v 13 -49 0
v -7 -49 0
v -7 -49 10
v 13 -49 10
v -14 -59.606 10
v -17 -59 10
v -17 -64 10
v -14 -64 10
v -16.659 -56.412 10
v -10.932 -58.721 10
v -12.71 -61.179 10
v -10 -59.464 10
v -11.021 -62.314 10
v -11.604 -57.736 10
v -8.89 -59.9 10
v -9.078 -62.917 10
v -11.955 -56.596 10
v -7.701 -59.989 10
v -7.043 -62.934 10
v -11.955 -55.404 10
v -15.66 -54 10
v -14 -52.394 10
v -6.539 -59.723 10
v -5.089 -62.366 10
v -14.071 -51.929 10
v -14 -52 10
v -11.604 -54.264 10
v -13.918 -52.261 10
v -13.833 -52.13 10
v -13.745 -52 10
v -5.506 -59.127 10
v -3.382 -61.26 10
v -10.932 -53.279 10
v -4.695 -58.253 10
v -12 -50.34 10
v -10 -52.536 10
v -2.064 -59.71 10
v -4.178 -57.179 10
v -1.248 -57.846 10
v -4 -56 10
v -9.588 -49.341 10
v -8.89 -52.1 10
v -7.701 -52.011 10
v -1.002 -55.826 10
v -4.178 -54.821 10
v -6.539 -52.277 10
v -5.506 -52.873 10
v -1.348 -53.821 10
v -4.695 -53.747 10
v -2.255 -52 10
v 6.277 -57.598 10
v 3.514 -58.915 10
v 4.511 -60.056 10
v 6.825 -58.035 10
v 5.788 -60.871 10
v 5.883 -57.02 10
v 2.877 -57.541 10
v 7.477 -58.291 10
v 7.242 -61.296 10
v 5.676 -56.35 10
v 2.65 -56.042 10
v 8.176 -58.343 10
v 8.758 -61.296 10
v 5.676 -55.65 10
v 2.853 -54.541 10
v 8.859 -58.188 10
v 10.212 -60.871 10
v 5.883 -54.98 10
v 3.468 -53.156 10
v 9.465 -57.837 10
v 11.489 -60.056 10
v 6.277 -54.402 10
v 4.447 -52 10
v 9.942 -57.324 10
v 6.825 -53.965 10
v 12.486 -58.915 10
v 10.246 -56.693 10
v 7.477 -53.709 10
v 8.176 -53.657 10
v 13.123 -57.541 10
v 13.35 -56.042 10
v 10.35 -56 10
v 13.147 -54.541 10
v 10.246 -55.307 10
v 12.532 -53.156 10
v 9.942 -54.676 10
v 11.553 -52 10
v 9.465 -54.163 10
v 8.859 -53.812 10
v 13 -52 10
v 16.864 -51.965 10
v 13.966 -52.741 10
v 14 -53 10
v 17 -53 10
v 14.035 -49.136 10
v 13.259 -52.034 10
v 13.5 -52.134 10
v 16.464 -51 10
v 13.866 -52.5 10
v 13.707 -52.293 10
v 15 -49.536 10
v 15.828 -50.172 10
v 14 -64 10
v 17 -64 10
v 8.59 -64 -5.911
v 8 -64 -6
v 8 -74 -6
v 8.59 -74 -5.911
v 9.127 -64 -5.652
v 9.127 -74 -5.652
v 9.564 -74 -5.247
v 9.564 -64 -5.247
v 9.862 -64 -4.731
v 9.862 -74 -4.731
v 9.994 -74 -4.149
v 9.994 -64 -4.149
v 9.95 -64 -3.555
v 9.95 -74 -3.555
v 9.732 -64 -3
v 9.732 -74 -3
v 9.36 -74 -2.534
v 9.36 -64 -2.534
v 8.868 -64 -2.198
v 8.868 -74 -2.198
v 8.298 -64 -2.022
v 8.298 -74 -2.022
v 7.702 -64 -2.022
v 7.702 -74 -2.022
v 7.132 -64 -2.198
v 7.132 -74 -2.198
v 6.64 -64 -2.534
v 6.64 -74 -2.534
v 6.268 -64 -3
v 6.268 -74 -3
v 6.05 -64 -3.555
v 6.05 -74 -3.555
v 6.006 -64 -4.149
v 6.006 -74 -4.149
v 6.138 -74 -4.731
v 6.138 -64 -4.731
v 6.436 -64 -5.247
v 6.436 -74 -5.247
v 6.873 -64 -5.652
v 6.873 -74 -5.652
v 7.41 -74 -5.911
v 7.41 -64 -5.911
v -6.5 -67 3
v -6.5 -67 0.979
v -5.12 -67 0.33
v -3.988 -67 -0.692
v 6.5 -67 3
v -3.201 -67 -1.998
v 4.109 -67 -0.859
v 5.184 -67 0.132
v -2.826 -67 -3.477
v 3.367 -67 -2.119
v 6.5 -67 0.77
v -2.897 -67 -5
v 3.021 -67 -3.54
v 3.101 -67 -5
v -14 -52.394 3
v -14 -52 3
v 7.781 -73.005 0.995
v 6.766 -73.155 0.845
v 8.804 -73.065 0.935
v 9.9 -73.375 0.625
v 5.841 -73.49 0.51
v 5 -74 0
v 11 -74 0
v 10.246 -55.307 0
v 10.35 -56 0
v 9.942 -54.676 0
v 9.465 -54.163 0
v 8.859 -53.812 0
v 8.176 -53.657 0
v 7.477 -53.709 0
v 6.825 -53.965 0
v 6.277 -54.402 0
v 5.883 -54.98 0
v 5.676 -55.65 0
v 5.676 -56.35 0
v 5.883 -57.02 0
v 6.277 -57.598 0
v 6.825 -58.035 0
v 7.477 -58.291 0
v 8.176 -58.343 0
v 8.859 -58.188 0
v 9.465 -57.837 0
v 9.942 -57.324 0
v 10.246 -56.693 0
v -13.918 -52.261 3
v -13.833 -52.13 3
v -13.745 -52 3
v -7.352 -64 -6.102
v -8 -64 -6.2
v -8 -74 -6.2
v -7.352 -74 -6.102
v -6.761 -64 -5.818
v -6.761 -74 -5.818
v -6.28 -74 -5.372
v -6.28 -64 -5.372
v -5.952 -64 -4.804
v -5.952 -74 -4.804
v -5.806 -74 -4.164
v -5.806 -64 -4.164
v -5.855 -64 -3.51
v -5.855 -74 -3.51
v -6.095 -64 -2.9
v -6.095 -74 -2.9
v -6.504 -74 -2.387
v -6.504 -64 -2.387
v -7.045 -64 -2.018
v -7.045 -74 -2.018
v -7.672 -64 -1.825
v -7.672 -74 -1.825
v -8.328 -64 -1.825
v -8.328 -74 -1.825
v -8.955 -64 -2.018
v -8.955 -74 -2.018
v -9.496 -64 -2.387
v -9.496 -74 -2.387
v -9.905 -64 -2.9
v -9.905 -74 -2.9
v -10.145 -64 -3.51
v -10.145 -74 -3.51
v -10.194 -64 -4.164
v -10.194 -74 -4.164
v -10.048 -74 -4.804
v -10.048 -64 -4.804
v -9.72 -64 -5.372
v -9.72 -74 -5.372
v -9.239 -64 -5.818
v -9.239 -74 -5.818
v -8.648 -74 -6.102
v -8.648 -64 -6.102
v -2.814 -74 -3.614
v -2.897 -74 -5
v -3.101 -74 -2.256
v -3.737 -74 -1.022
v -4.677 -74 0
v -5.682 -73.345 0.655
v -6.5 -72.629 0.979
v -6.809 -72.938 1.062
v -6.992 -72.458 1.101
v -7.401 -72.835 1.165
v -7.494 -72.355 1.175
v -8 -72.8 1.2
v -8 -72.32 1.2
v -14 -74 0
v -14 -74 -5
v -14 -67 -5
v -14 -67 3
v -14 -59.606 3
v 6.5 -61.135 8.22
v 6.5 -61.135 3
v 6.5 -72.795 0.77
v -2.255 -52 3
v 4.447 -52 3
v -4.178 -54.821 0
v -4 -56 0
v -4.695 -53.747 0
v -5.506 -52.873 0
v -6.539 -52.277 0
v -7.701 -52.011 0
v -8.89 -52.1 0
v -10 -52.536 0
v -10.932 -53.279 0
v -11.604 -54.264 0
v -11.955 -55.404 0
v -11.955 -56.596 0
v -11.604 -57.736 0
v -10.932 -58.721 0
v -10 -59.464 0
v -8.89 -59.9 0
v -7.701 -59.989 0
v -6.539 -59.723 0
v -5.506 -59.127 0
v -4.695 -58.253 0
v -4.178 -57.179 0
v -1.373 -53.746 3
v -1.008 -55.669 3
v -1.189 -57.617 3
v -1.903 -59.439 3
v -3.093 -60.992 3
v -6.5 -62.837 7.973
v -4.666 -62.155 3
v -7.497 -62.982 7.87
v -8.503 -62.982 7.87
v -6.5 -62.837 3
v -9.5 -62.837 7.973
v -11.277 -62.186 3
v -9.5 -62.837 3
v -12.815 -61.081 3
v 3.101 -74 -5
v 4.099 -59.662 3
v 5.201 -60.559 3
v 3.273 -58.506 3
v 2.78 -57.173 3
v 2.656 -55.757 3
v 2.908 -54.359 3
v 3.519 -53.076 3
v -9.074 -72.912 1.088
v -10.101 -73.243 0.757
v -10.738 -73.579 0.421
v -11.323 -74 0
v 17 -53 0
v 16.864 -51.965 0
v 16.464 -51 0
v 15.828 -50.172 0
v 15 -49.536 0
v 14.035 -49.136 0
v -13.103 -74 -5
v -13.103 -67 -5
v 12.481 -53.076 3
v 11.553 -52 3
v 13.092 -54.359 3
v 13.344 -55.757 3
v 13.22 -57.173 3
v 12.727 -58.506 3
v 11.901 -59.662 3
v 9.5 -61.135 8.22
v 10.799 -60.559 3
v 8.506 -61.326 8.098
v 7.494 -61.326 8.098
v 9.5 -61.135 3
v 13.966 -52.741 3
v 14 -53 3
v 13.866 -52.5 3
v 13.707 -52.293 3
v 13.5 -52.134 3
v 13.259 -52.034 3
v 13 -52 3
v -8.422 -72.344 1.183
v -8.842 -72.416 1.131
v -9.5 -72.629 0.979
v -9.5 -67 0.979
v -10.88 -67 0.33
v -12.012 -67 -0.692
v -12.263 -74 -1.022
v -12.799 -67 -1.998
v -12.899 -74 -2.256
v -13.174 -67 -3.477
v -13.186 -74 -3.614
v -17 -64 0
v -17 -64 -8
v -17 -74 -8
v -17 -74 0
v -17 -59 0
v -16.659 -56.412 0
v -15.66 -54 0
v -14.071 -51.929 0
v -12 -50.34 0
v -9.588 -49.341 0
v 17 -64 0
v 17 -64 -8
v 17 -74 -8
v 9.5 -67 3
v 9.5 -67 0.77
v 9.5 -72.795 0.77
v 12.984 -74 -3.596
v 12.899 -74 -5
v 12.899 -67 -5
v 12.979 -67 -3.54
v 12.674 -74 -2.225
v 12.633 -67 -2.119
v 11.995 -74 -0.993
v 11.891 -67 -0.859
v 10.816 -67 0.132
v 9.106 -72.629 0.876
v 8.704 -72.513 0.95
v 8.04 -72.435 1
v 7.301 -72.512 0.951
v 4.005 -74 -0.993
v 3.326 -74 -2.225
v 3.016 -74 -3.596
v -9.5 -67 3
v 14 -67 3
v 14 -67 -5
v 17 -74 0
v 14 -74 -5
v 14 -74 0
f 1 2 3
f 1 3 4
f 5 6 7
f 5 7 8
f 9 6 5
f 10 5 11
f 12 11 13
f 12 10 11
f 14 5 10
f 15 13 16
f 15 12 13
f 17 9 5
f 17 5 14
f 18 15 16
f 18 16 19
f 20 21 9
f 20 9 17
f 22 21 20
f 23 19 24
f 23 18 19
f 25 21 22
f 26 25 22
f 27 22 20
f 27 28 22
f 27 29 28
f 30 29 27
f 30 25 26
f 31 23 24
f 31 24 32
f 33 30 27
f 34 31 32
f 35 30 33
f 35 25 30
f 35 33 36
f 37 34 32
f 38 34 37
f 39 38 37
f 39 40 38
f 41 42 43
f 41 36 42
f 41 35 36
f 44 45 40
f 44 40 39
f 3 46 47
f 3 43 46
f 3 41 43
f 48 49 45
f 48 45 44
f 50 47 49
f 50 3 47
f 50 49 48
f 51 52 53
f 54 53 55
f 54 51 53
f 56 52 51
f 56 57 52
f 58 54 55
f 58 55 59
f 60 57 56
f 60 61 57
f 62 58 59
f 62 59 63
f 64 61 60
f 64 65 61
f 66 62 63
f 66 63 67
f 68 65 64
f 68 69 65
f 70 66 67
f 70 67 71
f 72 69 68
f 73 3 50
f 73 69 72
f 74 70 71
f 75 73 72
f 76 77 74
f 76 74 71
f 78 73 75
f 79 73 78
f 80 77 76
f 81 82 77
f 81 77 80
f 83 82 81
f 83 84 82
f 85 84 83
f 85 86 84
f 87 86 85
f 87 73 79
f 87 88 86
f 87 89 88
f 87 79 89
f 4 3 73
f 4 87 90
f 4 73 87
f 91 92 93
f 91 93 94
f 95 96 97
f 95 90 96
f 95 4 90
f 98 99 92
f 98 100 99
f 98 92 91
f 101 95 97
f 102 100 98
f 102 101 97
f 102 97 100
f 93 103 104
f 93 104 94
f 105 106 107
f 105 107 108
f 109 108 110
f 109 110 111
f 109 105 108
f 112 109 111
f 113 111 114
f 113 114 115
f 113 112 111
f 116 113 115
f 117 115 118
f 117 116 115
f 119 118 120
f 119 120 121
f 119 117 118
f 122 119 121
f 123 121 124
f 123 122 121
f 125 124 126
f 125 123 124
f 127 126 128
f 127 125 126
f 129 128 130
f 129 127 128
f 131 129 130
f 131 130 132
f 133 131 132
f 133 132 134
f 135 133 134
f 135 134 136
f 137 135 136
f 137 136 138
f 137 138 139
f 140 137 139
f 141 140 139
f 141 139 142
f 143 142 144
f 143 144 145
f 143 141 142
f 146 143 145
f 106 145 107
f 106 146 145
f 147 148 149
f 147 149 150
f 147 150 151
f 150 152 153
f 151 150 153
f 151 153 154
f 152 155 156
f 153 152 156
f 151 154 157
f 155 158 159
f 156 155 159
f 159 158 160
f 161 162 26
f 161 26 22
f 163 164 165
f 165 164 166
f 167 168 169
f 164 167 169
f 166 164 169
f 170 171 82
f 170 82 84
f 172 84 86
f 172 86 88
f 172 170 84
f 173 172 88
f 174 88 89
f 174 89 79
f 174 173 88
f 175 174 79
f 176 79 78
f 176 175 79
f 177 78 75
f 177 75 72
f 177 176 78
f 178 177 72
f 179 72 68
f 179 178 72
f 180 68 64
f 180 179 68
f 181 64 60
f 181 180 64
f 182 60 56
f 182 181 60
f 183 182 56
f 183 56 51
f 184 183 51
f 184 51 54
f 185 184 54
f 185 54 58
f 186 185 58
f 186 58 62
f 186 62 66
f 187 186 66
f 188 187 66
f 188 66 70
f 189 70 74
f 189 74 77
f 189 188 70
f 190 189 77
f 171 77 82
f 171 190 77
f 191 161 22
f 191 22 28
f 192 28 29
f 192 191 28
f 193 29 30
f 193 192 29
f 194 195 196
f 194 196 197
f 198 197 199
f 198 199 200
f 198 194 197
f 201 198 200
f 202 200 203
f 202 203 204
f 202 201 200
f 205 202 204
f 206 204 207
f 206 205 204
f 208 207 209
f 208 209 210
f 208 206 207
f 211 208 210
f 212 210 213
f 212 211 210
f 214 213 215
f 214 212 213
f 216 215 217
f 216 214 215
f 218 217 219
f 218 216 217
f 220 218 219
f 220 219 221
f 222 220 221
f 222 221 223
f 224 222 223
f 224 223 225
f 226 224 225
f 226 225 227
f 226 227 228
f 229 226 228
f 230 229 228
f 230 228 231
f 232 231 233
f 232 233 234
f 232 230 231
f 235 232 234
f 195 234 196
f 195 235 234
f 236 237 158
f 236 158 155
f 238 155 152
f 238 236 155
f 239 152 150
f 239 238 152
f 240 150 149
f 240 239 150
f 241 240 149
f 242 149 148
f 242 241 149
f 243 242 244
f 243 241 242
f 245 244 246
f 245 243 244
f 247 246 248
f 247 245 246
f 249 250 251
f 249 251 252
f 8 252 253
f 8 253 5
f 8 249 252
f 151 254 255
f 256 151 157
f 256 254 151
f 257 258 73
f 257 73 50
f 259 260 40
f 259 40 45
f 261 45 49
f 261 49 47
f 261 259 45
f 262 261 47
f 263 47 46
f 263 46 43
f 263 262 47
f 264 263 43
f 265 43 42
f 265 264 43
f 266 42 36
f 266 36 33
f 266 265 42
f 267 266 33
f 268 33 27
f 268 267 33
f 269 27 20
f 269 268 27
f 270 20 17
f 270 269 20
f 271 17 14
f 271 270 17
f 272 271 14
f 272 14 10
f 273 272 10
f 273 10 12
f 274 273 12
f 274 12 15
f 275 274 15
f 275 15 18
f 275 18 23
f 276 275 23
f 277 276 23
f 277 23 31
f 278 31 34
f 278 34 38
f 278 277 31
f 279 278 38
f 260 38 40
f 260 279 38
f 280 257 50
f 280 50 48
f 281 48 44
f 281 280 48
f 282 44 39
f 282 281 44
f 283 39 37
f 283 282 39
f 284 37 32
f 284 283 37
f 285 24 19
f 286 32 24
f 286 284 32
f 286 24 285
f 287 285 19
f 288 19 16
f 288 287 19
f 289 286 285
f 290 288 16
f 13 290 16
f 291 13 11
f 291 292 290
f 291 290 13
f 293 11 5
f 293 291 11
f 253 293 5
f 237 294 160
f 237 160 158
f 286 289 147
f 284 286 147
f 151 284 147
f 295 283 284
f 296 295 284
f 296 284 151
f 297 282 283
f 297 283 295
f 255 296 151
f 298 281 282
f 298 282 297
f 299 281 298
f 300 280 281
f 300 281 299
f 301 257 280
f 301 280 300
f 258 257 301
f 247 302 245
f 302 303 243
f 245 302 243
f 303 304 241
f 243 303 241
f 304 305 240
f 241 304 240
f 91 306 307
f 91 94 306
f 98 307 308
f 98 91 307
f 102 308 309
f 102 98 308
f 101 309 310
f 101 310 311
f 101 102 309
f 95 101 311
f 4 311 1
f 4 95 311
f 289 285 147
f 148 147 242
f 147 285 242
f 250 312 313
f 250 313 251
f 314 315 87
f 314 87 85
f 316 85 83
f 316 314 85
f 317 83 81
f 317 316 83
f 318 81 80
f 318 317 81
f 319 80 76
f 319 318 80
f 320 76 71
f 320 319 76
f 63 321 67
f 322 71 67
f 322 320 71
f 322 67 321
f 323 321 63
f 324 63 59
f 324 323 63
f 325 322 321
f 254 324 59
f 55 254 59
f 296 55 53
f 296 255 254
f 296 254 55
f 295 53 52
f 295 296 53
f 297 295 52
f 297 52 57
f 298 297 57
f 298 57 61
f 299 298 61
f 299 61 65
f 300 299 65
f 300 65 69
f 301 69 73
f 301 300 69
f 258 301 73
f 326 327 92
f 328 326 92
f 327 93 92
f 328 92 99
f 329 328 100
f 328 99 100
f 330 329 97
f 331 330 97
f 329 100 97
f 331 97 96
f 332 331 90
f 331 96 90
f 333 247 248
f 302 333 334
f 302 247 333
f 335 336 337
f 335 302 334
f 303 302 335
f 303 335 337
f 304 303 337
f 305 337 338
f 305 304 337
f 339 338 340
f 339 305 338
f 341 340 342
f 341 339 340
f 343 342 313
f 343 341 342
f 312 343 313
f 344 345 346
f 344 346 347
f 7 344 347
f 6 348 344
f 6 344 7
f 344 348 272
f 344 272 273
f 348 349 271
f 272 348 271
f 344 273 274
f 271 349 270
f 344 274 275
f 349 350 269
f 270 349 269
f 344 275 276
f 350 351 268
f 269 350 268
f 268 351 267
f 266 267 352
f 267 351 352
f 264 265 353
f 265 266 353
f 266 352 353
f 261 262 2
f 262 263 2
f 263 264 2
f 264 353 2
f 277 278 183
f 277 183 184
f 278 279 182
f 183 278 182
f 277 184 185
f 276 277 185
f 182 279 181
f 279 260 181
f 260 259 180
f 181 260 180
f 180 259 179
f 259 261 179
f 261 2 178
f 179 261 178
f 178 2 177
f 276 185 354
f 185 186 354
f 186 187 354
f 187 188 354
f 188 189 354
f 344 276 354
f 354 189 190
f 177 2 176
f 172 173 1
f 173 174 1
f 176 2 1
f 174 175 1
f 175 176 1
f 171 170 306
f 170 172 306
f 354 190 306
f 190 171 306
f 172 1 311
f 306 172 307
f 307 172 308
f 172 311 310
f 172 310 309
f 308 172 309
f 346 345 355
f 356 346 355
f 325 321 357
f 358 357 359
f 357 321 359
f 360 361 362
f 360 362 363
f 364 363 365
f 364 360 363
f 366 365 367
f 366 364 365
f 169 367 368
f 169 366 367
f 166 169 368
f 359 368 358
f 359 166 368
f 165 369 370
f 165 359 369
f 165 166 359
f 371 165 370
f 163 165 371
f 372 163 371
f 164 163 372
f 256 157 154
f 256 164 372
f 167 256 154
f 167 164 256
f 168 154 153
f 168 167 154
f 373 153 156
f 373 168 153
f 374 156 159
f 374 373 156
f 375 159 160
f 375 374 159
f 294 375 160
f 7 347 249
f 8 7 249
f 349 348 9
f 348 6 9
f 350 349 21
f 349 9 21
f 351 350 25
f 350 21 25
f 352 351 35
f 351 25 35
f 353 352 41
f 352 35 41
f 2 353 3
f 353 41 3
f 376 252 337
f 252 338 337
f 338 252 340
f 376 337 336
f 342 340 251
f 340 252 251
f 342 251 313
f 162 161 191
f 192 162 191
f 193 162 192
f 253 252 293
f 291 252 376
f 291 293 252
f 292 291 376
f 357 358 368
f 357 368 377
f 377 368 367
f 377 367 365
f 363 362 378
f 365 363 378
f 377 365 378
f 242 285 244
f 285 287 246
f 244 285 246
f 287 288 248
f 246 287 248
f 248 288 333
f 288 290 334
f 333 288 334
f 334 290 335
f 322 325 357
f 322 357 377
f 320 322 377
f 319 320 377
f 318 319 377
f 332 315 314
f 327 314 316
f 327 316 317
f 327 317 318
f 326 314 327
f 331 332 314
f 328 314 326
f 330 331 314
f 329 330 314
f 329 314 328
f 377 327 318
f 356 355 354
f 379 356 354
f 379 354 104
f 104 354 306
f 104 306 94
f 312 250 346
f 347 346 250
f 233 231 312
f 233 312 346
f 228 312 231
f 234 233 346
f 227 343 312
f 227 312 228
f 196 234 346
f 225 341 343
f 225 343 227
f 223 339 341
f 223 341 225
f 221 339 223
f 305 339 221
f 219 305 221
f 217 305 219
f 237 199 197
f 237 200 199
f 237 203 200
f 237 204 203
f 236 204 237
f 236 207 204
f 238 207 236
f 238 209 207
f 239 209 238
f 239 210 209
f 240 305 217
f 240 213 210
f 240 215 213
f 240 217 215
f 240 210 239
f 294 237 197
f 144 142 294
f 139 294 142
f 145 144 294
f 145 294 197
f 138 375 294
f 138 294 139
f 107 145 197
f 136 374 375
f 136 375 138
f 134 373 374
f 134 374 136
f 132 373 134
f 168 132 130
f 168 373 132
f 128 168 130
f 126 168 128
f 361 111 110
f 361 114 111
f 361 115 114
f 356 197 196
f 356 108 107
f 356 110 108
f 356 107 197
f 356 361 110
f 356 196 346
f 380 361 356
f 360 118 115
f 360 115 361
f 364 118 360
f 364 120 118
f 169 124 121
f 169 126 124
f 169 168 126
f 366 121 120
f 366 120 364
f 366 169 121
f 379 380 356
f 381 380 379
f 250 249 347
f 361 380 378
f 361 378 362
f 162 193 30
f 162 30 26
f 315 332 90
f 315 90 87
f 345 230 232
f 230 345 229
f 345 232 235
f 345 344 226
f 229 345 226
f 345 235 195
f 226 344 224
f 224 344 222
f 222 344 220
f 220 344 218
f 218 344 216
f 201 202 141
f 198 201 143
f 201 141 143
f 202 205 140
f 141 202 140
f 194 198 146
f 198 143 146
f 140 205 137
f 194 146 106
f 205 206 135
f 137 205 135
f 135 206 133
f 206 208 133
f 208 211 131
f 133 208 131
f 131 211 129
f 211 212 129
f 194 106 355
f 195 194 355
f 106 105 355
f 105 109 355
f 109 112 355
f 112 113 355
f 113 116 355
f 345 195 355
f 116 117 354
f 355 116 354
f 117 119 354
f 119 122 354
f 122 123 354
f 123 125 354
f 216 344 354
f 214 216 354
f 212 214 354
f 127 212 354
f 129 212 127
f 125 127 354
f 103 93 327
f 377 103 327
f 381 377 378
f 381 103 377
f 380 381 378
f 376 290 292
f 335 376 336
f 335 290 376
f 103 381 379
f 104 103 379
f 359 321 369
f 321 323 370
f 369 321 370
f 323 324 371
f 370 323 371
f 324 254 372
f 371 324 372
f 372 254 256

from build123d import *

# Parameters (mm, degrees)
ESQUISSE1_W        = 34
ESQUISSE1_H        = 15
ESQUISSE1_R        = 2.35
ESQUISSE1_R_2      = 4
BOSS_EXTRU_1_DEPTH = 10
ESQUISSE2_W        = 34
ESQUISSE2_H        = 18
ESQUISSE2_R        = 2.2
ESQUISSE2_R_2      = 2
BOSS_EXTRU_2_DEPTH = 10
CHANFREIN2_SIZE    = 10
COQUE1_START       = 3
COQUE1_DEPTH       = 7
COQUE1_START_2     = 1.2
COQUE1_2_OUTLINE_W = 28
COQUE1_2_OUTLINE_H = 7
COQUE1_2_DEPTH     = 1.8
COQUE1_START_3     = -74
COQUE1_3_DEPTH     = 7
CONG_1_R           = 10
CONG_3_R           = 1
CONG_4_R           = 4
NERVURE3_REACH     = 80.746
ESQUISSE4_WALL_W   = 176.697507514
ESQUISSE4_WALL_H   = 3
NERVURE5_REACH     = 80.746
ESQUISSE5_WALL_W   = 178.064946254
ESQUISSE5_WALL_H   = 3


with BuildPart() as part:
    # Esquisse1 → Boss.-Extru.1 (new body)
    with BuildSketch(Plane.XY):
        with Locations((0, -56.5)):
            Rectangle(ESQUISSE1_W, ESQUISSE1_H)
        with Locations((8, -56)):
            Circle(ESQUISSE1_R, mode=Mode.SUBTRACT)
        with Locations((-8, -56)):
            Circle(ESQUISSE1_R_2, mode=Mode.SUBTRACT)
    extrude(amount=BOSS_EXTRU_1_DEPTH)

    # Esquisse2 → Boss.-Extru.2 (add)
    with BuildSketch(Plane.XZ.offset(64)):
        with Locations((0, 1)):
            Rectangle(ESQUISSE2_W, ESQUISSE2_H)
        with Locations(Location((-8, -4, 0), (0, 0, 270))):
            Circle(ESQUISSE2_R, mode=Mode.SUBTRACT)
        with Locations(Location((8, -4, 0), (0, 0, 270))):
            Circle(ESQUISSE2_R_2, mode=Mode.SUBTRACT)
    extrude(amount=BOSS_EXTRU_2_DEPTH)

    # Chanfrein2
    chanfrein2_edges = [part.edges().sort_by_distance(p)[0] for p in [
        (0, -74, 10),
    ]]
    chamfer(chanfrein2_edges, length=CHANFREIN2_SIZE)

    # Coque1: read off the stored shape, not the designer's step
    # Coque1 outline → Coque1 (cut)
    with BuildSketch(Plane.XY.offset(COQUE1_START)):
        with BuildLine():
            Line((14, -74), (14, -52))
            Line((14, -52), (11.552815785, -52))
            ThreePointArc((11.552815785, -52), (8, -61.35), (4.447184215, -52))
            Line((4.447184215, -52), (-2.255437353, -52))
            ThreePointArc((-2.255437353, -52), (-4.19508021, -61.875592344), (-14, -59.605551275))
            Line((-14, -59.605551275), (-14, -74))
            Line((-14, -74), (14, -74))
        make_face()
        with BuildLine():
            ThreePointArc((-14, -52.394448725), (-13.875592344, -52.19508021), (-13.744562647, -52))
            Line((-13.744562647, -52), (-14, -52))
            Line((-14, -52), (-14, -52.394448725))
        make_face()
    extrude(amount=COQUE1_DEPTH, mode=Mode.SUBTRACT)

    # Coque1 2 outline → Coque1 2 (cut)
    with BuildSketch(Plane.XY.offset(COQUE1_START_2)):
        with Locations((0, -70.5)):
            Rectangle(COQUE1_2_OUTLINE_W, COQUE1_2_OUTLINE_H)
    extrude(amount=COQUE1_2_DEPTH, mode=Mode.SUBTRACT)

    # Coque1 3 outline → Coque1 3 (cut)
    with BuildSketch(Plane(origin=(0, 0, 0), x_dir=(1, 0, 0), z_dir=(0, 1, 0)).offset(COQUE1_START_3)):
        with BuildLine():
            ThreePointArc((-2.897059671, 5), (-3.98502802, 0.695457672), (-8, -1.2))
            Line((-8, -1.2), (14, -1.2))
            Line((14, -1.2), (14, 5))
            Line((14, 5), (12.898979486, 5))
            ThreePointArc((12.898979486, 5), (8, -1), (3.101020514, 5))
            Line((3.101020514, 5), (-2.897059671, 5))
        make_face()
        with BuildLine():
            ThreePointArc((-8, -1.2), (-12.01497198, 0.695457672), (-13.102940329, 5))
            Line((-13.102940329, 5), (-14, 5))
            Line((-14, 5), (-14, -1.2))
            Line((-14, -1.2), (-8, -1.2))
        make_face()
    extrude(amount=COQUE1_3_DEPTH, mode=Mode.SUBTRACT)

    # Congé1
    cong_1_edges = [part.edges().sort_by_distance(p)[0] for p in [
        (-17, -49, 5),
    ]]
    fillet(cong_1_edges, radius=CONG_1_R)

    # Congé3
    cong_3_edges = [part.edges().sort_by_distance(p)[0] for p in [
        (14, -52, 6.5),
    ]]
    fillet(cong_3_edges, radius=CONG_3_R)

    # Congé4
    cong_4_edges = [part.edges().sort_by_distance(p)[0] for p in [
        (17, -49, 5),
    ]]
    fillet(cong_4_edges, radius=CONG_4_R)

    # Esquisse4 wall → Nervure3 (add, up to next)
    with BuildSketch(Plane(origin=(-8, -67, 5), x_dir=(0, -0.813733471207, -0.581238193719), z_dir=(0, 0.581238193719, -0.813733471207)), mode=Mode.PRIVATE) as nervure3_sk1:
        Rectangle(ESQUISSE4_WALL_W, ESQUISSE4_WALL_H)
    nervure3_tool1 = extrude(nervure3_sk1.sketch, amount=NERVURE3_REACH, mode=Mode.PRIVATE) - part.part
    add(nervure3_tool1.solids().sort_by_distance((-8, -67, 5))[0])

    # Esquisse5 wall → Nervure5 (add, up to next)
    with BuildSketch(Plane(origin=(8, -66.175, 5), x_dir=(0, -0.842662328893, -0.538442382679), z_dir=(0, 0.538442382679, -0.842662328893)), mode=Mode.PRIVATE) as nervure5_sk1:
        Rectangle(ESQUISSE5_WALL_W, ESQUISSE5_WALL_H)
    nervure5_tool1 = extrude(nervure5_sk1.sketch, amount=NERVURE5_REACH, mode=Mode.PRIVATE) - part.part
    add(nervure5_tool1.solids().sort_by_distance((8, -66.175, 5))[0])


solid = part.part
